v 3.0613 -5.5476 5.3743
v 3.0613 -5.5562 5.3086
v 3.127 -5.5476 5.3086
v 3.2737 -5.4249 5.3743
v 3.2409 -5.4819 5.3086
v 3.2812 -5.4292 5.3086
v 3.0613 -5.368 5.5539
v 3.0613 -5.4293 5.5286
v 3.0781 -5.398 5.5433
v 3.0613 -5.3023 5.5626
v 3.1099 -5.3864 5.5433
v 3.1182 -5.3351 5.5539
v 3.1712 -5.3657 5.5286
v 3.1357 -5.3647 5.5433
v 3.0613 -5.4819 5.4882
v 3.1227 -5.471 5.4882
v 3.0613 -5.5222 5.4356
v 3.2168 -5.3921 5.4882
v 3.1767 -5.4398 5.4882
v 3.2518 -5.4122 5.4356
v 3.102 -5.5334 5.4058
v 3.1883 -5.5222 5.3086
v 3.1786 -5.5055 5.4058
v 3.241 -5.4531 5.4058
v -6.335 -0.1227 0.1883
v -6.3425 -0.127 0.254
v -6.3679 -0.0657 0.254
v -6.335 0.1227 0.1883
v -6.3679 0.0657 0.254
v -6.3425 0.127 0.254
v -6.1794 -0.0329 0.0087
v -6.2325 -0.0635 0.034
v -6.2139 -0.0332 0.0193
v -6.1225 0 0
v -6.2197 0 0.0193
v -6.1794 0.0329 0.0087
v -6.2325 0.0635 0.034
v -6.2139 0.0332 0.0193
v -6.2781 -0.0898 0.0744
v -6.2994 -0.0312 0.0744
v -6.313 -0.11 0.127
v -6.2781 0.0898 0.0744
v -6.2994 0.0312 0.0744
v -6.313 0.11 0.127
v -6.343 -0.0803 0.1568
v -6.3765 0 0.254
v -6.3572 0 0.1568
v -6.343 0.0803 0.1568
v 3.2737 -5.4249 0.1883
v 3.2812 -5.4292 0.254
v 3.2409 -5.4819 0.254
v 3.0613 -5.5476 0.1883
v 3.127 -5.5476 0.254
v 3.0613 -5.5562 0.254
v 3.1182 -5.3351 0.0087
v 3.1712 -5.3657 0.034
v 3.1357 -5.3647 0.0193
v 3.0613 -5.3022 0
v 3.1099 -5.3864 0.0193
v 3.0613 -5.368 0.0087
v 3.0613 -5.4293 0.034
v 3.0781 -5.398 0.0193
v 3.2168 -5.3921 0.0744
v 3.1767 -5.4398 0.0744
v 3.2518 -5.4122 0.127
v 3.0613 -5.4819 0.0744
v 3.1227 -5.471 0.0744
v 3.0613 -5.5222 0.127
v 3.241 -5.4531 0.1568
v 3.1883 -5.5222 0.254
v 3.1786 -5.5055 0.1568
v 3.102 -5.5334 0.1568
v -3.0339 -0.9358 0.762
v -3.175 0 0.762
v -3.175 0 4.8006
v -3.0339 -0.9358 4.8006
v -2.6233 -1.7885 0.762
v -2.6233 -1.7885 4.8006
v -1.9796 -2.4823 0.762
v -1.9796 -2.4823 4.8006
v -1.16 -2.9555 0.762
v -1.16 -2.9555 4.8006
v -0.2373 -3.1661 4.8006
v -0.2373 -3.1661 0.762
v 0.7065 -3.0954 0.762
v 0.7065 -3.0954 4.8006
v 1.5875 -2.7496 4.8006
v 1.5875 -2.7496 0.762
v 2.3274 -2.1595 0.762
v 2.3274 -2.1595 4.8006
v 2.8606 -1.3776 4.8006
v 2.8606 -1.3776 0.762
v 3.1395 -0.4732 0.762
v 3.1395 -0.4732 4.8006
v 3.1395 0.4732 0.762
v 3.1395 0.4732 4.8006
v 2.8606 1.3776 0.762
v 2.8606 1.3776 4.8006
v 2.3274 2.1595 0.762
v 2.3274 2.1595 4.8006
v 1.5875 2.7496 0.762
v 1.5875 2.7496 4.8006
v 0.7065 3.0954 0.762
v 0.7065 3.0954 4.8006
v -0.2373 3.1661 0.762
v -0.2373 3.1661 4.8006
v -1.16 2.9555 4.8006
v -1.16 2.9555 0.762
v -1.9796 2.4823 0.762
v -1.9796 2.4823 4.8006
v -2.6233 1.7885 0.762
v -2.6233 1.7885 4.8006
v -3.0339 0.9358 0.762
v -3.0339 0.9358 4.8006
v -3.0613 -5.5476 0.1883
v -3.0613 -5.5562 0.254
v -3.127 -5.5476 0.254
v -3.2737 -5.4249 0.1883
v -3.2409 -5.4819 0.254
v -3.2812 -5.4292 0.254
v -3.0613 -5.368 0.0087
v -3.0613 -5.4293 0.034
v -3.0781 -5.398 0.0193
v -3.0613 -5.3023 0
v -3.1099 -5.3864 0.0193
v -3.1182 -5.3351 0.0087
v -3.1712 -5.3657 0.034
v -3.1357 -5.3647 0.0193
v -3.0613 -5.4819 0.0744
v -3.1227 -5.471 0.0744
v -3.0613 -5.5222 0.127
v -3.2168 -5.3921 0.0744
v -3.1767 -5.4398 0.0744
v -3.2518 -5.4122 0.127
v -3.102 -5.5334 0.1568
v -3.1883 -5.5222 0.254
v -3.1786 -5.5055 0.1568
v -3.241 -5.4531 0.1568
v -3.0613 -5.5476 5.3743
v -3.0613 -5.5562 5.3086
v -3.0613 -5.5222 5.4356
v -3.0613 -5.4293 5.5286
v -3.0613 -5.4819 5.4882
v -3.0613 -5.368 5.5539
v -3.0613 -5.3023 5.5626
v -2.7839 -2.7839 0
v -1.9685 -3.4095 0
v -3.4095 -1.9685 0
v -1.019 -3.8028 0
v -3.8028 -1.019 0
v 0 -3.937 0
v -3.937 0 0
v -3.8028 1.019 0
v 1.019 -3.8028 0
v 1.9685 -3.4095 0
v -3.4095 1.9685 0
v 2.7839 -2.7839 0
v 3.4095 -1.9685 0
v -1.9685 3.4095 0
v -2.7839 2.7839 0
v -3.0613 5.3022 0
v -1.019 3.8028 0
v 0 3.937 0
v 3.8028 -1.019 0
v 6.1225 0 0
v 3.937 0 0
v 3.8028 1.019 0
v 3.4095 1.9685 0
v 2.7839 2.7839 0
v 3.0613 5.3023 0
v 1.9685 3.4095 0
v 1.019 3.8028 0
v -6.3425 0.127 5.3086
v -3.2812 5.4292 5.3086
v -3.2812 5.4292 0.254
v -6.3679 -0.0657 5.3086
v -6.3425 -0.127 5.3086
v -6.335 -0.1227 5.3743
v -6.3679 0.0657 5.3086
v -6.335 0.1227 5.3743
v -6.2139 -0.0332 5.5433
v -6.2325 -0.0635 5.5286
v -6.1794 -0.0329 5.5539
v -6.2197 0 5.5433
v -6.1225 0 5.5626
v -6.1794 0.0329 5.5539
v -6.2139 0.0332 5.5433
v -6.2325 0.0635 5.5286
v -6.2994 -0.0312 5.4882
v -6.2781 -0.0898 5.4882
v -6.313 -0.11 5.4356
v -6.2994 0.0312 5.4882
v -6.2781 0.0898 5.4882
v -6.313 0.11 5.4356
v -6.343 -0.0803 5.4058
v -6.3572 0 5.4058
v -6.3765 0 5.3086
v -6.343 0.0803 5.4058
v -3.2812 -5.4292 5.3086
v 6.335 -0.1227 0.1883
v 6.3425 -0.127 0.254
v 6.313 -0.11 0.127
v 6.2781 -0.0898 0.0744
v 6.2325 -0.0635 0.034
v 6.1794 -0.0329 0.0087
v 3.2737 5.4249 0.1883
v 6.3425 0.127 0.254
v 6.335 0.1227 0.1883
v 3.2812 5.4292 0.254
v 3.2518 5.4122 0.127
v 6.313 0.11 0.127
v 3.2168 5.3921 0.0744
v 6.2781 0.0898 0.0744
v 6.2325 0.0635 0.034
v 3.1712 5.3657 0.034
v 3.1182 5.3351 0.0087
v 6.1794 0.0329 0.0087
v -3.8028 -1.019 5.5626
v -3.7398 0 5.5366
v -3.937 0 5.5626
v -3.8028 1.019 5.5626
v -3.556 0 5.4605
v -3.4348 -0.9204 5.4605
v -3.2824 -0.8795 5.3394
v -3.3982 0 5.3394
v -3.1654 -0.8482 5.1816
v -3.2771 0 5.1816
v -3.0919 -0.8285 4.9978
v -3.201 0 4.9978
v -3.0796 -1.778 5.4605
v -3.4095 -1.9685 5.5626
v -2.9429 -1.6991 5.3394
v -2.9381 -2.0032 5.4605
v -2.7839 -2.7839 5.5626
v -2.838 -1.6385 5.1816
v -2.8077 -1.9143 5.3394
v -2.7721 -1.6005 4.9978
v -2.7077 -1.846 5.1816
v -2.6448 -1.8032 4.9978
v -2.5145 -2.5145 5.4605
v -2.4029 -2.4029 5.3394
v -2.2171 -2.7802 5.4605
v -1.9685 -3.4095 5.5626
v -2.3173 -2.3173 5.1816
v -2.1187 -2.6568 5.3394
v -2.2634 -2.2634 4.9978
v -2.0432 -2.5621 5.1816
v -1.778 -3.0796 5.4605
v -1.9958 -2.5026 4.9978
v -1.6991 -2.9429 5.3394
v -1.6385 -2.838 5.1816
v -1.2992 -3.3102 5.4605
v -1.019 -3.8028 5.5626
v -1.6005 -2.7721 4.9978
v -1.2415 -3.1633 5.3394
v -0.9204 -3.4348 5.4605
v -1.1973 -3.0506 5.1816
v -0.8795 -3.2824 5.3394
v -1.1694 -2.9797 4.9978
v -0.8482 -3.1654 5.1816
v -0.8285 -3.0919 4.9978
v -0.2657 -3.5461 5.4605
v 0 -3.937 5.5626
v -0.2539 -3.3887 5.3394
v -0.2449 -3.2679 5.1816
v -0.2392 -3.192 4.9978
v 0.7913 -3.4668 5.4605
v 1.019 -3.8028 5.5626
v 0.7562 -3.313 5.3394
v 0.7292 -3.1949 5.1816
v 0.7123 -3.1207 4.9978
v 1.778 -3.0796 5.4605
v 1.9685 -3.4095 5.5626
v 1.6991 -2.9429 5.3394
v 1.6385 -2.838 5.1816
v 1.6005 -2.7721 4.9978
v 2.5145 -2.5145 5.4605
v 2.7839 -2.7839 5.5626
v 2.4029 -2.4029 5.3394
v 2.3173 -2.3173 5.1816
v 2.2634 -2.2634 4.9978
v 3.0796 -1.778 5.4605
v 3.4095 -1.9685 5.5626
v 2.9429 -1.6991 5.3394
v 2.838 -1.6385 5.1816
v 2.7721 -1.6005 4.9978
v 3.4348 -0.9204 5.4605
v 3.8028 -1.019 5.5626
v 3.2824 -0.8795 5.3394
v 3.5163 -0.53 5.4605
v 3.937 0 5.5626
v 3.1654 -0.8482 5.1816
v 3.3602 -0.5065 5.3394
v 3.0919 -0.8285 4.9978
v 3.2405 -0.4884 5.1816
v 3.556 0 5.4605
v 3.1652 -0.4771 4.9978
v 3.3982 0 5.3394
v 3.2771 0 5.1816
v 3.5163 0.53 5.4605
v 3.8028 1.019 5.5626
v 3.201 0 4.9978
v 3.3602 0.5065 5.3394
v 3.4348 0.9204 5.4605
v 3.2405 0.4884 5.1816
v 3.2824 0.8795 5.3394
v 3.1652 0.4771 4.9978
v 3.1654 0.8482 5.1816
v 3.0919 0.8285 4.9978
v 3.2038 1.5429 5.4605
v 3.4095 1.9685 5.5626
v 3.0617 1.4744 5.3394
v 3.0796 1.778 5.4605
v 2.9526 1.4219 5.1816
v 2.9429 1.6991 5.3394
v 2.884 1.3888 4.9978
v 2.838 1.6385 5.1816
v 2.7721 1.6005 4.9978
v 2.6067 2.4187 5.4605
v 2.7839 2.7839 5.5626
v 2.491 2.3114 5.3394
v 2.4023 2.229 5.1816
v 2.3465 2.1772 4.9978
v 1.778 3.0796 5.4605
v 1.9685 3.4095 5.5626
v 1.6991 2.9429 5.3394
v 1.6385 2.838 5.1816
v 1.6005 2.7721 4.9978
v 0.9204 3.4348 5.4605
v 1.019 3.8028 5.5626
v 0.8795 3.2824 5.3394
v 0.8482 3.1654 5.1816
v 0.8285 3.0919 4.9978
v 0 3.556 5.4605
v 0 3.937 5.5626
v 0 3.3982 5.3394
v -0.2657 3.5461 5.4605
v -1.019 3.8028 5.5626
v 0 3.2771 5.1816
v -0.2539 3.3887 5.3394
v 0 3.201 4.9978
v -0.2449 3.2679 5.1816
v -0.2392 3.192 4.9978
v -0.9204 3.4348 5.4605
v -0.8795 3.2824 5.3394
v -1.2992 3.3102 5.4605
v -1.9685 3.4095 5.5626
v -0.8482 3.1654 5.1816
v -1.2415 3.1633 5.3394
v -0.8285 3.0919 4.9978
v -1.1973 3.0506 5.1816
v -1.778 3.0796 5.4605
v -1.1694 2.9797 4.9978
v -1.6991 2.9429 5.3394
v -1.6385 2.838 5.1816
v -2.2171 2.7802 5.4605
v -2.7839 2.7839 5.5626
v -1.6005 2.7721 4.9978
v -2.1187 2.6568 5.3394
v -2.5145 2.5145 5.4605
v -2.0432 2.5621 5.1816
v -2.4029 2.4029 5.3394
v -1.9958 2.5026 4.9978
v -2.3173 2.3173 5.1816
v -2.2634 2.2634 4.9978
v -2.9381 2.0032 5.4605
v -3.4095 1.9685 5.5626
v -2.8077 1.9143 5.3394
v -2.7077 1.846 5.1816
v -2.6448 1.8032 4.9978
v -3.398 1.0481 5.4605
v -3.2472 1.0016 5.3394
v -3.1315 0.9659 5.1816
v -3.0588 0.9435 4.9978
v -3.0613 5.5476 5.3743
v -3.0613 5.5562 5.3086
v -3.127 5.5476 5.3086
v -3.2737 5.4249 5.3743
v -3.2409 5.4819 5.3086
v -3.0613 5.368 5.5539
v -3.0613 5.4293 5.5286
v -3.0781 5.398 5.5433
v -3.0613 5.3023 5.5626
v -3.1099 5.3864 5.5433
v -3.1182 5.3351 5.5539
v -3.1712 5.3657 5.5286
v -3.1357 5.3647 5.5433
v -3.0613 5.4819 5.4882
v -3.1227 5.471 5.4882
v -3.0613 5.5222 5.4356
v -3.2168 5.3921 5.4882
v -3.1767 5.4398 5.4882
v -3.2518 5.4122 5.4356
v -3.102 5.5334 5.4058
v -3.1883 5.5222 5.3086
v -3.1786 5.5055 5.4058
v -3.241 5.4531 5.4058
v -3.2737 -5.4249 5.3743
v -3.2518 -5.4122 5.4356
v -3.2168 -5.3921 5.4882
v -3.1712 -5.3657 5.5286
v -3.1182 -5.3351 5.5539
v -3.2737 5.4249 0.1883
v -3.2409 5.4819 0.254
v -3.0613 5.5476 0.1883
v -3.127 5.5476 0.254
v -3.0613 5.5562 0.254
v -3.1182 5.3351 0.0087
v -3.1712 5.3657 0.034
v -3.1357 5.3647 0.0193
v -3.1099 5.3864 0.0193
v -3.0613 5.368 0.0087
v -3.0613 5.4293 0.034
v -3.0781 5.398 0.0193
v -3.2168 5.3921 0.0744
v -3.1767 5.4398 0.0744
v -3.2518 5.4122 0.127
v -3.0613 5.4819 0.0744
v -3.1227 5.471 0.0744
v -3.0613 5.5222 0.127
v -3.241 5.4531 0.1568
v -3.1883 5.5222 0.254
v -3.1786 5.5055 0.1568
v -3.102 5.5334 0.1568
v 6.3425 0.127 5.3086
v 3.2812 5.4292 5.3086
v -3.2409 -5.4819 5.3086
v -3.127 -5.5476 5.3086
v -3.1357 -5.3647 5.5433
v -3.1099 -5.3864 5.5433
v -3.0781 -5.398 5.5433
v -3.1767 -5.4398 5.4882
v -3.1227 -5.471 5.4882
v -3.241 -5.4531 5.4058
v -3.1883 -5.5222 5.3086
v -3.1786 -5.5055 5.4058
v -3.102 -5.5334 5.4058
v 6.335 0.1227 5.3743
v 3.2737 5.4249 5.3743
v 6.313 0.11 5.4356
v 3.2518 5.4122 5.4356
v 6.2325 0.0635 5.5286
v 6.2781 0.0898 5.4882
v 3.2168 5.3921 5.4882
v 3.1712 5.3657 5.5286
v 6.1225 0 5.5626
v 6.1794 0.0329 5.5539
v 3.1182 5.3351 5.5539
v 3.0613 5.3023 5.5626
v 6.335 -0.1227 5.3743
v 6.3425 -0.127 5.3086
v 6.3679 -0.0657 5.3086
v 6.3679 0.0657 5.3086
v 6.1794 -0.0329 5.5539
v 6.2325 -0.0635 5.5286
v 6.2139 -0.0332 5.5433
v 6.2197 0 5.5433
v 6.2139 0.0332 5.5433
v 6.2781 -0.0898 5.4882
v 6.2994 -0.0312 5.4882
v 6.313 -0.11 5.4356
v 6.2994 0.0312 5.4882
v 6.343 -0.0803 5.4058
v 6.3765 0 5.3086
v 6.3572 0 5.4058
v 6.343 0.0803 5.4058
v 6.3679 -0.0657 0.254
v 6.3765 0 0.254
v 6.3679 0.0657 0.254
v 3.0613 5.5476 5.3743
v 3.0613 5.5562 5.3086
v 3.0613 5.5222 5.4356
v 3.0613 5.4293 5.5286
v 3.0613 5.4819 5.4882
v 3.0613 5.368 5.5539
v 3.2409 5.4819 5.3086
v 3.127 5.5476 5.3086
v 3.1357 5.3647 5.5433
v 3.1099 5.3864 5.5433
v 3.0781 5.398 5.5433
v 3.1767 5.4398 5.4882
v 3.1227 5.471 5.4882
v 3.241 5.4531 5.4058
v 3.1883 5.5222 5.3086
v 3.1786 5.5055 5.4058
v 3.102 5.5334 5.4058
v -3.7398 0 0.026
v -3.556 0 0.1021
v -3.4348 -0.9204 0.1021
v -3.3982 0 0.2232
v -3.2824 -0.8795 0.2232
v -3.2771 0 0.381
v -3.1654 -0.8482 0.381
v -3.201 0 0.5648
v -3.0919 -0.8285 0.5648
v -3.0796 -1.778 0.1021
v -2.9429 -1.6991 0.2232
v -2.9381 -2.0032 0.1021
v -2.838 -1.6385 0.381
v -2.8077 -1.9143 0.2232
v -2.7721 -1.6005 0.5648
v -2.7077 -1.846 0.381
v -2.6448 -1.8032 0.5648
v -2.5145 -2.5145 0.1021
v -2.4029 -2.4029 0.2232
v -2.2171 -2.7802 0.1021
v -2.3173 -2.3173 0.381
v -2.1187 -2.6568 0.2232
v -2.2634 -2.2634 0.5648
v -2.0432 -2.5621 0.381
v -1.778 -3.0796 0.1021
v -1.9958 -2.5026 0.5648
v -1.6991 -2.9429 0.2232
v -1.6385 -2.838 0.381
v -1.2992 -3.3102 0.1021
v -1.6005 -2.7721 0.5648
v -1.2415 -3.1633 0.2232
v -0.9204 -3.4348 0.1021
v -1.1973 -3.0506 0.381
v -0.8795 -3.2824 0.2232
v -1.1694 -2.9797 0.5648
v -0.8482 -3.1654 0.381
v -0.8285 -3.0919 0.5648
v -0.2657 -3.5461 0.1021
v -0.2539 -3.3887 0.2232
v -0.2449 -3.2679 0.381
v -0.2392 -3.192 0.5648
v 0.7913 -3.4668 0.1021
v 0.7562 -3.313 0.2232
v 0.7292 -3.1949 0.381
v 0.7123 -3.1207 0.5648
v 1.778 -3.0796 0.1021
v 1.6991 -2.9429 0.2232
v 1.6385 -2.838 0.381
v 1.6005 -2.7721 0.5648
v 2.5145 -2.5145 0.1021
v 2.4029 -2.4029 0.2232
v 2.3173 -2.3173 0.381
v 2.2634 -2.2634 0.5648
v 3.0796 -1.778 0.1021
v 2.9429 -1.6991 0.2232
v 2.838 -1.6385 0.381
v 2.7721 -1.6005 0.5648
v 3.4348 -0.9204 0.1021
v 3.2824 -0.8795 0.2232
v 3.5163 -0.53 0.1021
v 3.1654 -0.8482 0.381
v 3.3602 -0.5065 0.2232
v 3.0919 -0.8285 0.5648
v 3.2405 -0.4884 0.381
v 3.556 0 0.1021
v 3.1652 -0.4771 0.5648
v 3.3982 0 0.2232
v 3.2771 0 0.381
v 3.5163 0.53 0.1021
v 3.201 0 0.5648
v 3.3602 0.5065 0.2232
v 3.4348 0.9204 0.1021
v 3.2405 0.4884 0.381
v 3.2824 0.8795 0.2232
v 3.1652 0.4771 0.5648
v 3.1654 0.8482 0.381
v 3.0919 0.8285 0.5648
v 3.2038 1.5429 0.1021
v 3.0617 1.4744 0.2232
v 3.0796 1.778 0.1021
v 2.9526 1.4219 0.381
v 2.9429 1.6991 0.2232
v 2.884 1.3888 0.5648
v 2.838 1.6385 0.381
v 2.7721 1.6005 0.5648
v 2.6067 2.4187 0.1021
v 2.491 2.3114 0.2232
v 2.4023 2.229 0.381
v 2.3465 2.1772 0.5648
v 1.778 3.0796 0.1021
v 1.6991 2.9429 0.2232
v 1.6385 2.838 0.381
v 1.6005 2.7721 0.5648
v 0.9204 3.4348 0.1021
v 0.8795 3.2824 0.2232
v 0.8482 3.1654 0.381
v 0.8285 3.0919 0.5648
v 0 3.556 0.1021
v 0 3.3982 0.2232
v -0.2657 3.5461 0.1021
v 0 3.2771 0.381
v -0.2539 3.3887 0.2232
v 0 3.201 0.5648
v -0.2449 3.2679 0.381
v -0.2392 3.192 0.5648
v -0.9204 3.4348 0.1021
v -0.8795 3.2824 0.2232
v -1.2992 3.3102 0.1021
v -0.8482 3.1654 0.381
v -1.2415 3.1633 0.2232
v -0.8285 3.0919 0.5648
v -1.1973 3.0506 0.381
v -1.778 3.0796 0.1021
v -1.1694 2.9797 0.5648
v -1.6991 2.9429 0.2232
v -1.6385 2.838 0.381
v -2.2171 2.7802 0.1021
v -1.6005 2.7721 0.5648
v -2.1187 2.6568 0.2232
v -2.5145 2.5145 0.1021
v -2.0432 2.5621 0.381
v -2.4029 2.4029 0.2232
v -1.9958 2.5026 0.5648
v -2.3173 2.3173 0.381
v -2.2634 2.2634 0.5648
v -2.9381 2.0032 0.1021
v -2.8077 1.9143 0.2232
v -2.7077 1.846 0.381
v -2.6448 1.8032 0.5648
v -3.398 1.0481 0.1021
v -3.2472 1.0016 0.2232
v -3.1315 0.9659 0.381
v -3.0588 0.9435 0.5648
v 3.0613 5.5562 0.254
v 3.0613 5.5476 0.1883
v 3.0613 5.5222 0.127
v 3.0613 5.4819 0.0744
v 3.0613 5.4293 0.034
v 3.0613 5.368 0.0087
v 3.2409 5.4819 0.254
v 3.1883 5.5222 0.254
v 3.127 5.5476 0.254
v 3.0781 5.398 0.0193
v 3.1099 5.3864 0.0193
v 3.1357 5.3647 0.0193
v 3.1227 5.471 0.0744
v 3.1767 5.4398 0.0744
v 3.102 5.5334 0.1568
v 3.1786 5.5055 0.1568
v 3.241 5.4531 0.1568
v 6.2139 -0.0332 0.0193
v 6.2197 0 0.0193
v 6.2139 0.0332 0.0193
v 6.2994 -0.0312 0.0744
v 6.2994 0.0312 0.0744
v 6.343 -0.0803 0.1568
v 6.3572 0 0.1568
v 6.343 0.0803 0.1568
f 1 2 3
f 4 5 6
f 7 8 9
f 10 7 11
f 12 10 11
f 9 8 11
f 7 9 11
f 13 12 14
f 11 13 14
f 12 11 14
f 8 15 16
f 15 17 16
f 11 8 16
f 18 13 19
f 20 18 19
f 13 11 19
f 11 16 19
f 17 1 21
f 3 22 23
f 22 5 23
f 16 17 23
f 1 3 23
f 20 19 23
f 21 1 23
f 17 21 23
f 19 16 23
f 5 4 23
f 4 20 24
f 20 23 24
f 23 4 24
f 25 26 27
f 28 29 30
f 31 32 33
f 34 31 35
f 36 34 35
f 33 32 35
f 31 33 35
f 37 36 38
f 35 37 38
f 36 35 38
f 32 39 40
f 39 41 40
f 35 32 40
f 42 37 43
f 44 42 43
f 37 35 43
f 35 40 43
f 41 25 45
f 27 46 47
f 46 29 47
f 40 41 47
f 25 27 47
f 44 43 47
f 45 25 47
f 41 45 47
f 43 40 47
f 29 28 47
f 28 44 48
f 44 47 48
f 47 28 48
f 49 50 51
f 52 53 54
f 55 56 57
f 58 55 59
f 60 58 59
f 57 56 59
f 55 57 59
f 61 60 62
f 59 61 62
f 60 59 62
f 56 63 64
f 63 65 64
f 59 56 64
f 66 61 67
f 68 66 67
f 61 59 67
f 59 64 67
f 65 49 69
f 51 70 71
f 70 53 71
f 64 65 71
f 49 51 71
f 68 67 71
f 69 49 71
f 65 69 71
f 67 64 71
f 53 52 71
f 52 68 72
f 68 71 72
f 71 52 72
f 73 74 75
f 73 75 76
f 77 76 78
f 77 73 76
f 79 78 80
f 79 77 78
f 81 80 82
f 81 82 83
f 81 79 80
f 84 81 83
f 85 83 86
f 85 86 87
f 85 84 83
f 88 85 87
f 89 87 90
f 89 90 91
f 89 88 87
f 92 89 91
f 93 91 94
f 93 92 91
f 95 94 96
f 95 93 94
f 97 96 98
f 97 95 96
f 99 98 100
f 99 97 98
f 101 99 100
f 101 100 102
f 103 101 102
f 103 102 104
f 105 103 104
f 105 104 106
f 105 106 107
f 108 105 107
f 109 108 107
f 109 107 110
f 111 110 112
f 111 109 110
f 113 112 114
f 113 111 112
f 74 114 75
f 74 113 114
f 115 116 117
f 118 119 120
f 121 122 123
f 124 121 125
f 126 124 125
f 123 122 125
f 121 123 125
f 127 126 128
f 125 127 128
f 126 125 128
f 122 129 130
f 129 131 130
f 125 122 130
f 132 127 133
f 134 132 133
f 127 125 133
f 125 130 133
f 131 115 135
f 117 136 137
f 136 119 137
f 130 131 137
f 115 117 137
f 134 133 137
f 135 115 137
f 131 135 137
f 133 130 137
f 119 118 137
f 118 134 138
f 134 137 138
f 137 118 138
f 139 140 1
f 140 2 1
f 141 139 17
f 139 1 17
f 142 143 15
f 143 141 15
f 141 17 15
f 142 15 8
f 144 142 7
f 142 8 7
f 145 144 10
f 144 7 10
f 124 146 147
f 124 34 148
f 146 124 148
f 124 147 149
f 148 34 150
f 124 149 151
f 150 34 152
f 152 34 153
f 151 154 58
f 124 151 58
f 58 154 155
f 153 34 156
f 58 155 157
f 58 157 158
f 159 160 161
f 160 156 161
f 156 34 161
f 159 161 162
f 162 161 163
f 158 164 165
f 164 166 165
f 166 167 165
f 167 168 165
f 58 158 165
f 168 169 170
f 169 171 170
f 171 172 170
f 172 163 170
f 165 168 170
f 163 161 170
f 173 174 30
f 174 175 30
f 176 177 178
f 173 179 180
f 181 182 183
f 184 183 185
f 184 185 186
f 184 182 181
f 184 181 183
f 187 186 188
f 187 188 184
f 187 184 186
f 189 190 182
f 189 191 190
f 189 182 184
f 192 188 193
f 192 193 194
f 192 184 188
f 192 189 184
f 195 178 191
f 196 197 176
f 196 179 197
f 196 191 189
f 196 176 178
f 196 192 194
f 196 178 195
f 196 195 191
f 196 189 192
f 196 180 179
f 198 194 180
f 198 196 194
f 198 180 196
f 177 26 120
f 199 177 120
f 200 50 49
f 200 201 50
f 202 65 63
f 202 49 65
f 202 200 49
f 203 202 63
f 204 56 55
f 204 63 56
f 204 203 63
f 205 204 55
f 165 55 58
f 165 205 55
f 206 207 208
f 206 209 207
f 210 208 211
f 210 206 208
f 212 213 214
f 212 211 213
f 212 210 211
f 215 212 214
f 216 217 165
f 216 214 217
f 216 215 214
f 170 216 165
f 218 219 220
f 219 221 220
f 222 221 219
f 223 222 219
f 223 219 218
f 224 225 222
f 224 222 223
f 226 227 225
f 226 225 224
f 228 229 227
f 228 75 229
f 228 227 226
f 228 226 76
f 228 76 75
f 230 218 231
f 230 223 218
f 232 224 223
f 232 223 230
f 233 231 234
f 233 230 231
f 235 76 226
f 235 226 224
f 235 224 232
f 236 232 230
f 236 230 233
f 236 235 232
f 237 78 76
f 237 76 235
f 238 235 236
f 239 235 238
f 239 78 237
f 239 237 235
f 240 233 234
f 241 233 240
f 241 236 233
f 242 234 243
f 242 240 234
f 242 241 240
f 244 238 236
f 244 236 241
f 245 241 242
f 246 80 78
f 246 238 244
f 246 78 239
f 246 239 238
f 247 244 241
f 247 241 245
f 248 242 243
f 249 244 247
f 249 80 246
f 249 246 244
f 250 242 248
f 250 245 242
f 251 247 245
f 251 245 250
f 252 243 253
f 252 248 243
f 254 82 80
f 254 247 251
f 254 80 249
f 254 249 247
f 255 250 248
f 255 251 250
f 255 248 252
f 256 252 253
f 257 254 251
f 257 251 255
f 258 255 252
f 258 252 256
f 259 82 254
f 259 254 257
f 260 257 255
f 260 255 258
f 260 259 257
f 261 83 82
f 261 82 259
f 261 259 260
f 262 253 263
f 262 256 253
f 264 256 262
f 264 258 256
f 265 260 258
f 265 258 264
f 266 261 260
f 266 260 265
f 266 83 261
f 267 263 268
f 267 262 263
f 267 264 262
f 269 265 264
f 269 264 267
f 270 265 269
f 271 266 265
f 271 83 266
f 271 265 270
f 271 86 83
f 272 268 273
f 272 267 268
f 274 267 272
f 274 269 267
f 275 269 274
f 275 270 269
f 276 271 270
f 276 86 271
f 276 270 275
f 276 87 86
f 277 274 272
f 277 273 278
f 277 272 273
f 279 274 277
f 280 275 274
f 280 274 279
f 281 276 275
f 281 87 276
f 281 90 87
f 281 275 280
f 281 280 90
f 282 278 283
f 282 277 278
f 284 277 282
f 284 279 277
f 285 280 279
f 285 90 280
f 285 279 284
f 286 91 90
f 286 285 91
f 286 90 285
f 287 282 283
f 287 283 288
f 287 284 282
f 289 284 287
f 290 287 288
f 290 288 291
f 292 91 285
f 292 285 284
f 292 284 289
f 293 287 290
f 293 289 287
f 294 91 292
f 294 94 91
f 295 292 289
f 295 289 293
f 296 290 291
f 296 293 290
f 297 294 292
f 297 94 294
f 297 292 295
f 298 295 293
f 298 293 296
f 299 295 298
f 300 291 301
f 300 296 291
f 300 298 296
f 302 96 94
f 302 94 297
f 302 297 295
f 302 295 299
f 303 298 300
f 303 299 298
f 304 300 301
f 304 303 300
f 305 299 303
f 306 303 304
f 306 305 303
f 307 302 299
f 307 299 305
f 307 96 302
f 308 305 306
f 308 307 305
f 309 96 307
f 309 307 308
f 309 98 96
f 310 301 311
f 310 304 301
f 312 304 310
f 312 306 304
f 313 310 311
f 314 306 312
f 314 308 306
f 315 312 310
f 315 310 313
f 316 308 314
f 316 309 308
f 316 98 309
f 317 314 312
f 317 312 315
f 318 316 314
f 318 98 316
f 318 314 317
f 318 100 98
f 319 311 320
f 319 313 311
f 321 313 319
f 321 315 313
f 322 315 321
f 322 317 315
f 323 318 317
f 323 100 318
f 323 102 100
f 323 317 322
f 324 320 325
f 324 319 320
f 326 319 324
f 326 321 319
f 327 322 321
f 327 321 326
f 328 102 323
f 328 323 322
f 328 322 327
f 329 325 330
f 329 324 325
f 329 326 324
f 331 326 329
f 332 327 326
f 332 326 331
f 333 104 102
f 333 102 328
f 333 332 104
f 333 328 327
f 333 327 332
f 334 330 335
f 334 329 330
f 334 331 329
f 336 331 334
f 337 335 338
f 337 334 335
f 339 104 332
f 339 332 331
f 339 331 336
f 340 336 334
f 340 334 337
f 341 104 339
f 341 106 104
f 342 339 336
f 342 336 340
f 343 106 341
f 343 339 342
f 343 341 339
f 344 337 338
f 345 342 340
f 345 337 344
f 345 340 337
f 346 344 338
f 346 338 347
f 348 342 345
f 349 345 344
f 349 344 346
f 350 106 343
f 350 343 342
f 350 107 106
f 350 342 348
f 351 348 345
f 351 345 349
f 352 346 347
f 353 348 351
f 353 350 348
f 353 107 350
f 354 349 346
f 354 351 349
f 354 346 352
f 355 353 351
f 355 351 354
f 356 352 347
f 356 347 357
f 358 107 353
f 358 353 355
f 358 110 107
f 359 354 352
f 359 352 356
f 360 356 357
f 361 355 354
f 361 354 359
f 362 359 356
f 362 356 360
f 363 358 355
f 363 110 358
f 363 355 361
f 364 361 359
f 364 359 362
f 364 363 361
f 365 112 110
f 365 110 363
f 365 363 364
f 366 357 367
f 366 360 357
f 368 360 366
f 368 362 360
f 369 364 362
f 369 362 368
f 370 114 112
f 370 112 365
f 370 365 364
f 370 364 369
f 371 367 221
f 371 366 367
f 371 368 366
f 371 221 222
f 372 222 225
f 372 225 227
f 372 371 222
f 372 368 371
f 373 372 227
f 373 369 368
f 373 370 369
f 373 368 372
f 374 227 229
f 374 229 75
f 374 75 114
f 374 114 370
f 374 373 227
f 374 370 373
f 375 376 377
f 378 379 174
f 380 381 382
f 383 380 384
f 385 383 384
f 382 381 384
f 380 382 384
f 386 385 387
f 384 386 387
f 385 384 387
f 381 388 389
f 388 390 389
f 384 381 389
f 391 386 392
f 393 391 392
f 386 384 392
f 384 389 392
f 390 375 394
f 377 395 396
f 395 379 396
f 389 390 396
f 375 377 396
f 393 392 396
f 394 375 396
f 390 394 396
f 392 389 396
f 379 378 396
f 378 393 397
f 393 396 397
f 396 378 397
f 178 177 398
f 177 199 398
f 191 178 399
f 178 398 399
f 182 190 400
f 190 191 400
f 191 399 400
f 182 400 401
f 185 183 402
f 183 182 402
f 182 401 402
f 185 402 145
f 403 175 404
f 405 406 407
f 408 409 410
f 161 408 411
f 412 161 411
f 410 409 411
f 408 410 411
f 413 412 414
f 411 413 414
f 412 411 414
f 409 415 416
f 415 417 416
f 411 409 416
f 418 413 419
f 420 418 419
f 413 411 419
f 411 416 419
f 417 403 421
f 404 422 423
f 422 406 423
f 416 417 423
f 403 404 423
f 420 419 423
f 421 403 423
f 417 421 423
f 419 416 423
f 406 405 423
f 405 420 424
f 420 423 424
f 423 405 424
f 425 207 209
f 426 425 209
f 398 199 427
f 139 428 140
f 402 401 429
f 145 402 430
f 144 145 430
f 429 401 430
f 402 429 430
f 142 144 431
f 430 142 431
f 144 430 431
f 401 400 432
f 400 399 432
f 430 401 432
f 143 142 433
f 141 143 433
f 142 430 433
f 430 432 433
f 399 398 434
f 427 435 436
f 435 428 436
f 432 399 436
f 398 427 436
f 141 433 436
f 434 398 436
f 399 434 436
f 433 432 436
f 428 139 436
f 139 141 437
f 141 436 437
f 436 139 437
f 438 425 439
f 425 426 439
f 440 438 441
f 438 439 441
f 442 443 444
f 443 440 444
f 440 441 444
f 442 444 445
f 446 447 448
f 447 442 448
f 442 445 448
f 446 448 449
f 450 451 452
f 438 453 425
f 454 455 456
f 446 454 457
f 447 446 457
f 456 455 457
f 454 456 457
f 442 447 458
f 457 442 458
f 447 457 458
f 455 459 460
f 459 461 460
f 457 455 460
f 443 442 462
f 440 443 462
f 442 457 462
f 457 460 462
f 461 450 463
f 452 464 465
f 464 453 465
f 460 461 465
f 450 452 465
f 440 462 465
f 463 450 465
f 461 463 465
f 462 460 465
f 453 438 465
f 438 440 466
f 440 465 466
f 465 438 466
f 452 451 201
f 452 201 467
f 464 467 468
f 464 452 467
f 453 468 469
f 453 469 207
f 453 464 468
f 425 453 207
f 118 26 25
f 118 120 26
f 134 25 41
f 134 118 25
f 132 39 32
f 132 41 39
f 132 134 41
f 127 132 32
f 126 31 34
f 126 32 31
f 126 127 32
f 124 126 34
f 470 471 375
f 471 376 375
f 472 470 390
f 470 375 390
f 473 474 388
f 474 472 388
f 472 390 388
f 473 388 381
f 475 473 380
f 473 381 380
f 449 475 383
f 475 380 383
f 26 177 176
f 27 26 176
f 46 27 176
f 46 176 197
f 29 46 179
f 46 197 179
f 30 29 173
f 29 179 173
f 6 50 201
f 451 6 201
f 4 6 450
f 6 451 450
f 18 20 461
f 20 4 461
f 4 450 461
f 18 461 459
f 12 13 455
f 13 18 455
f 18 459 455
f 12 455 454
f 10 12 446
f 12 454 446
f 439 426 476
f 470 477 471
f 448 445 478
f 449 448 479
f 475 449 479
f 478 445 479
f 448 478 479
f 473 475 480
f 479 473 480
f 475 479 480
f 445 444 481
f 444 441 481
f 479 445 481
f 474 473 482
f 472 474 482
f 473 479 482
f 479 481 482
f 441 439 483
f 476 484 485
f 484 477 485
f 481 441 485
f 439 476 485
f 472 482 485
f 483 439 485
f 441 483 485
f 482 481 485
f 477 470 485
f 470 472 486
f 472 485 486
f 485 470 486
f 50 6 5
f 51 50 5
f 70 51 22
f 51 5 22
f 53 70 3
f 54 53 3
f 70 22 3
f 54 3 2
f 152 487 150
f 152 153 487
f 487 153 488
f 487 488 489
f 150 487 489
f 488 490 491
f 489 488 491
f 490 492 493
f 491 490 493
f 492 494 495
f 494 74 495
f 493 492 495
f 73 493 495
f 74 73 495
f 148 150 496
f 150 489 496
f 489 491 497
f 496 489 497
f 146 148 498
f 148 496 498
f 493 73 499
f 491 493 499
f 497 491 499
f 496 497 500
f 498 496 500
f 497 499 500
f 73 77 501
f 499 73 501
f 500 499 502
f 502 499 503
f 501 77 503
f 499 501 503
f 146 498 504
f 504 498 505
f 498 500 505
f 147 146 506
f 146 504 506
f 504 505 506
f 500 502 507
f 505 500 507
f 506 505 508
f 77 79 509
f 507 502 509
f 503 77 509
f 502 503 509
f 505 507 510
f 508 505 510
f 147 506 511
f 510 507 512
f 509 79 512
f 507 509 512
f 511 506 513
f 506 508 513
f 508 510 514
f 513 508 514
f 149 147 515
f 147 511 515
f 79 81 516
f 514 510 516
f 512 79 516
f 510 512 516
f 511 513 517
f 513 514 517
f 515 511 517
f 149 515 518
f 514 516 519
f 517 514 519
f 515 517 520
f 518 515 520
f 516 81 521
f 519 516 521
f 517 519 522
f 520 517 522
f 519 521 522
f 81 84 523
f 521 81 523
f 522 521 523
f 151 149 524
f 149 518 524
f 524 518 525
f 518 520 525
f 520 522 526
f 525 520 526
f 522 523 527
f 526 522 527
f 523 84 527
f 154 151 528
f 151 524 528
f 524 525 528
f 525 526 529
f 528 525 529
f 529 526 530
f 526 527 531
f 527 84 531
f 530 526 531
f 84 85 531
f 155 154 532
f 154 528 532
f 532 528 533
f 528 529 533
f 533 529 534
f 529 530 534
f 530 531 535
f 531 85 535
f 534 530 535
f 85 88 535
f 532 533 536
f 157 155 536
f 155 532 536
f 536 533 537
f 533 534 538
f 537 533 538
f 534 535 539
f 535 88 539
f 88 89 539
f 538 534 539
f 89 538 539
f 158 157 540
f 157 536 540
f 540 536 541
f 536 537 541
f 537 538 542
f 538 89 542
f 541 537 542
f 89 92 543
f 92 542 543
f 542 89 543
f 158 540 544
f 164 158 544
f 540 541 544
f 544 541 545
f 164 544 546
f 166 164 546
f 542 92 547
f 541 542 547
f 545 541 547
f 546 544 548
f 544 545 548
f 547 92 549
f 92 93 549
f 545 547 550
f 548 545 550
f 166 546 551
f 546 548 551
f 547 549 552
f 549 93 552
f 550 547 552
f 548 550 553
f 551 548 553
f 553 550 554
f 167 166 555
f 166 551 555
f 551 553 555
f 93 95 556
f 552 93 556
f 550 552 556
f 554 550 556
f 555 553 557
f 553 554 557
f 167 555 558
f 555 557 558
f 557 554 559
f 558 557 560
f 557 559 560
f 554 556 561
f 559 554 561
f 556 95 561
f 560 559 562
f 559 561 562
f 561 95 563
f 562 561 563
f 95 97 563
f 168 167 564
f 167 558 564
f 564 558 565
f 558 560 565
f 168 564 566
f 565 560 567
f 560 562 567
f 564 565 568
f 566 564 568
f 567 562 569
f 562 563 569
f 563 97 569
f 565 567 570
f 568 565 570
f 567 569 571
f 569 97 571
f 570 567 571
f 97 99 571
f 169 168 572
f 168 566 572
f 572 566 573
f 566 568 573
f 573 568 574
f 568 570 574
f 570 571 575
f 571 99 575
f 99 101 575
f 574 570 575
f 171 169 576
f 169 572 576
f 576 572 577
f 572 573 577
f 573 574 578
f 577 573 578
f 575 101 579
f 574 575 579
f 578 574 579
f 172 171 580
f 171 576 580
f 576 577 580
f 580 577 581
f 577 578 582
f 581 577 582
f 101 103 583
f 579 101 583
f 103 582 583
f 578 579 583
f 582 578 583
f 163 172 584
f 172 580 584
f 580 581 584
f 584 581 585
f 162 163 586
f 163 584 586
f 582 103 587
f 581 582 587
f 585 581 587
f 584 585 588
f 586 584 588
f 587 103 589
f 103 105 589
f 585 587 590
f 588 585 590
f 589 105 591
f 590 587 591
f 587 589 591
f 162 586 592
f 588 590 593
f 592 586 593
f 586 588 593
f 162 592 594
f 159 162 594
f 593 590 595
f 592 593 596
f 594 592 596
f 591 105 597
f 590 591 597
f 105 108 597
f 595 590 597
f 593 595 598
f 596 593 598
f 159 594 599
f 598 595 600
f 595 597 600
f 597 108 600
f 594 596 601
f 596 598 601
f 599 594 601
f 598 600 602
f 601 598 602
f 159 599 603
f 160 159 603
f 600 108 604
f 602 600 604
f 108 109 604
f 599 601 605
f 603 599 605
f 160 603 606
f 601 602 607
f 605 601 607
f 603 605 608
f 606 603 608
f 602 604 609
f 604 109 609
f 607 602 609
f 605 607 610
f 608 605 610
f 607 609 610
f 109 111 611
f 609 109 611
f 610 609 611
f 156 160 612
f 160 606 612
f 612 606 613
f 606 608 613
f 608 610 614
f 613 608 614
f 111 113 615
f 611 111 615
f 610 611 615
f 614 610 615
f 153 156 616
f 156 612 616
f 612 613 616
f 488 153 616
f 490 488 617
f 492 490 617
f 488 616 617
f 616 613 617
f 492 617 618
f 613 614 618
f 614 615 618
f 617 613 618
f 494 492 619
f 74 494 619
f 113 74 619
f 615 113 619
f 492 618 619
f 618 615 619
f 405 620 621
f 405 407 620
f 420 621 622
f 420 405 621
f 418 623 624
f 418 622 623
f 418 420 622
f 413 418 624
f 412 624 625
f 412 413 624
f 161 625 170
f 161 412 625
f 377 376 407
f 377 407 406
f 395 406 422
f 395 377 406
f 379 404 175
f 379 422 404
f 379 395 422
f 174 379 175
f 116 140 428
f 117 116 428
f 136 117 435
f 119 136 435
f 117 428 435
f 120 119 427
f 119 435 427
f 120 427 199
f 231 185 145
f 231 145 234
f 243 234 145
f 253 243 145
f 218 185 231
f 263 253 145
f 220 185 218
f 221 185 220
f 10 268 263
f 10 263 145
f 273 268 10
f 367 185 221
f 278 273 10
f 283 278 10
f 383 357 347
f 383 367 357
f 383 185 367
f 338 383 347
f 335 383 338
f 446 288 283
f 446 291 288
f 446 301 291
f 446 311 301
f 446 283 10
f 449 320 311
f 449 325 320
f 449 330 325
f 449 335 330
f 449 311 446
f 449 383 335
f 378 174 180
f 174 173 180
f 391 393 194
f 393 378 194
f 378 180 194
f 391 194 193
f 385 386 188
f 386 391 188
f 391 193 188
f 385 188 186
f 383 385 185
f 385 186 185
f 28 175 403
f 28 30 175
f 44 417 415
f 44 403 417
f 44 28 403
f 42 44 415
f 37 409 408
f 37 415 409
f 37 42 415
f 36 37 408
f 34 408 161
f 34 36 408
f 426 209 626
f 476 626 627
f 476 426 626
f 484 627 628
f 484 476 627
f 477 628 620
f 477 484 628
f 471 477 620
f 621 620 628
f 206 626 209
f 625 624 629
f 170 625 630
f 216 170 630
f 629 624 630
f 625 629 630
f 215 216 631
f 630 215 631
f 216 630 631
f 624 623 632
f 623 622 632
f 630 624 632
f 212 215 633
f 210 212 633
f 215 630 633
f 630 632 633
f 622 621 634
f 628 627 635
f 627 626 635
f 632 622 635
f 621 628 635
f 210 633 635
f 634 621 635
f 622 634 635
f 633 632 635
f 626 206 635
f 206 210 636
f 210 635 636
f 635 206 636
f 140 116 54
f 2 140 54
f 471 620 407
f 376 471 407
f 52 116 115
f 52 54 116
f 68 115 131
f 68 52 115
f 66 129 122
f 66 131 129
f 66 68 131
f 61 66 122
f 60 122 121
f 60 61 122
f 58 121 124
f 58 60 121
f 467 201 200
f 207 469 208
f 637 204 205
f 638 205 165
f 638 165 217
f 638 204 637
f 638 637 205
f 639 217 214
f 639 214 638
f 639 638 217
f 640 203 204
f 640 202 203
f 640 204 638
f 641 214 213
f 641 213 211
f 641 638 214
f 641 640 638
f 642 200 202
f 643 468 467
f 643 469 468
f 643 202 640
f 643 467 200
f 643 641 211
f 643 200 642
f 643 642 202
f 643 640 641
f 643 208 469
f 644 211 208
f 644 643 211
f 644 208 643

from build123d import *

# Parameters (mm, degrees)
SKETCH1_R           = 3.175
BOSS_EXTRUDE1_DEPTH = 5.5626
FILLET1_R           = 0.254
FILLET2_R           = 0.762


with BuildPart() as part:
    # Sketch1 → Boss-Extrude1 (new body)
    with BuildSketch(Plane.XY):
        Polygon((3.207902433, -5.55625), (6.415804866, 0), (3.207902433, 5.55625), (-3.207902433, 5.55625), (-6.415804866, 0), (-3.207902433, -5.55625), align=None)
        with Locations(Location((0, 0, 0), (0, 0, 180))):
            Circle(SKETCH1_R, mode=Mode.SUBTRACT)
    extrude(amount=BOSS_EXTRUDE1_DEPTH)

    # Fillet1
    fillet1_edges = [part.edges().sort_by_distance(p)[0] for p in [
        (-4.81185365, 2.778125, 5.5626),
        (6.415804866, 0, 2.7813),
        (3.207902433, -5.55625, 2.7813),
        (-3.207902433, -5.55625, 2.7813),
        (-6.415804866, 0, 2.7813),
        (-3.207902433, 5.55625, 2.7813),
        (3.207902433, 5.55625, 2.7813),
        (-4.81185365, -2.778125, 5.5626),
        (0, -5.55625, 5.5626),
        (4.81185365, -2.778125, 5.5626),
        (4.81185365, 2.778125, 5.5626),
        (4.81185365, -2.778125, 0),
        (0, -5.55625, 0),
        (-4.81185365, -2.778125, 0),
        (0, 5.55625, 5.5626),
        (-4.81185365, 2.778125, 0),
        (0, 5.55625, 0),
        (4.81185365, 2.778125, 0),
    ]]
    fillet(fillet1_edges, radius=FILLET1_R)

    # Fillet2
    fillet2_edges = [part.edges().sort_by_distance(p)[0] for p in [
        (3.175, 0, 0),
        (3.175, 0, 5.5626),
    ]]
    fillet(fillet2_edges, radius=FILLET2_R)


solid = part.part
